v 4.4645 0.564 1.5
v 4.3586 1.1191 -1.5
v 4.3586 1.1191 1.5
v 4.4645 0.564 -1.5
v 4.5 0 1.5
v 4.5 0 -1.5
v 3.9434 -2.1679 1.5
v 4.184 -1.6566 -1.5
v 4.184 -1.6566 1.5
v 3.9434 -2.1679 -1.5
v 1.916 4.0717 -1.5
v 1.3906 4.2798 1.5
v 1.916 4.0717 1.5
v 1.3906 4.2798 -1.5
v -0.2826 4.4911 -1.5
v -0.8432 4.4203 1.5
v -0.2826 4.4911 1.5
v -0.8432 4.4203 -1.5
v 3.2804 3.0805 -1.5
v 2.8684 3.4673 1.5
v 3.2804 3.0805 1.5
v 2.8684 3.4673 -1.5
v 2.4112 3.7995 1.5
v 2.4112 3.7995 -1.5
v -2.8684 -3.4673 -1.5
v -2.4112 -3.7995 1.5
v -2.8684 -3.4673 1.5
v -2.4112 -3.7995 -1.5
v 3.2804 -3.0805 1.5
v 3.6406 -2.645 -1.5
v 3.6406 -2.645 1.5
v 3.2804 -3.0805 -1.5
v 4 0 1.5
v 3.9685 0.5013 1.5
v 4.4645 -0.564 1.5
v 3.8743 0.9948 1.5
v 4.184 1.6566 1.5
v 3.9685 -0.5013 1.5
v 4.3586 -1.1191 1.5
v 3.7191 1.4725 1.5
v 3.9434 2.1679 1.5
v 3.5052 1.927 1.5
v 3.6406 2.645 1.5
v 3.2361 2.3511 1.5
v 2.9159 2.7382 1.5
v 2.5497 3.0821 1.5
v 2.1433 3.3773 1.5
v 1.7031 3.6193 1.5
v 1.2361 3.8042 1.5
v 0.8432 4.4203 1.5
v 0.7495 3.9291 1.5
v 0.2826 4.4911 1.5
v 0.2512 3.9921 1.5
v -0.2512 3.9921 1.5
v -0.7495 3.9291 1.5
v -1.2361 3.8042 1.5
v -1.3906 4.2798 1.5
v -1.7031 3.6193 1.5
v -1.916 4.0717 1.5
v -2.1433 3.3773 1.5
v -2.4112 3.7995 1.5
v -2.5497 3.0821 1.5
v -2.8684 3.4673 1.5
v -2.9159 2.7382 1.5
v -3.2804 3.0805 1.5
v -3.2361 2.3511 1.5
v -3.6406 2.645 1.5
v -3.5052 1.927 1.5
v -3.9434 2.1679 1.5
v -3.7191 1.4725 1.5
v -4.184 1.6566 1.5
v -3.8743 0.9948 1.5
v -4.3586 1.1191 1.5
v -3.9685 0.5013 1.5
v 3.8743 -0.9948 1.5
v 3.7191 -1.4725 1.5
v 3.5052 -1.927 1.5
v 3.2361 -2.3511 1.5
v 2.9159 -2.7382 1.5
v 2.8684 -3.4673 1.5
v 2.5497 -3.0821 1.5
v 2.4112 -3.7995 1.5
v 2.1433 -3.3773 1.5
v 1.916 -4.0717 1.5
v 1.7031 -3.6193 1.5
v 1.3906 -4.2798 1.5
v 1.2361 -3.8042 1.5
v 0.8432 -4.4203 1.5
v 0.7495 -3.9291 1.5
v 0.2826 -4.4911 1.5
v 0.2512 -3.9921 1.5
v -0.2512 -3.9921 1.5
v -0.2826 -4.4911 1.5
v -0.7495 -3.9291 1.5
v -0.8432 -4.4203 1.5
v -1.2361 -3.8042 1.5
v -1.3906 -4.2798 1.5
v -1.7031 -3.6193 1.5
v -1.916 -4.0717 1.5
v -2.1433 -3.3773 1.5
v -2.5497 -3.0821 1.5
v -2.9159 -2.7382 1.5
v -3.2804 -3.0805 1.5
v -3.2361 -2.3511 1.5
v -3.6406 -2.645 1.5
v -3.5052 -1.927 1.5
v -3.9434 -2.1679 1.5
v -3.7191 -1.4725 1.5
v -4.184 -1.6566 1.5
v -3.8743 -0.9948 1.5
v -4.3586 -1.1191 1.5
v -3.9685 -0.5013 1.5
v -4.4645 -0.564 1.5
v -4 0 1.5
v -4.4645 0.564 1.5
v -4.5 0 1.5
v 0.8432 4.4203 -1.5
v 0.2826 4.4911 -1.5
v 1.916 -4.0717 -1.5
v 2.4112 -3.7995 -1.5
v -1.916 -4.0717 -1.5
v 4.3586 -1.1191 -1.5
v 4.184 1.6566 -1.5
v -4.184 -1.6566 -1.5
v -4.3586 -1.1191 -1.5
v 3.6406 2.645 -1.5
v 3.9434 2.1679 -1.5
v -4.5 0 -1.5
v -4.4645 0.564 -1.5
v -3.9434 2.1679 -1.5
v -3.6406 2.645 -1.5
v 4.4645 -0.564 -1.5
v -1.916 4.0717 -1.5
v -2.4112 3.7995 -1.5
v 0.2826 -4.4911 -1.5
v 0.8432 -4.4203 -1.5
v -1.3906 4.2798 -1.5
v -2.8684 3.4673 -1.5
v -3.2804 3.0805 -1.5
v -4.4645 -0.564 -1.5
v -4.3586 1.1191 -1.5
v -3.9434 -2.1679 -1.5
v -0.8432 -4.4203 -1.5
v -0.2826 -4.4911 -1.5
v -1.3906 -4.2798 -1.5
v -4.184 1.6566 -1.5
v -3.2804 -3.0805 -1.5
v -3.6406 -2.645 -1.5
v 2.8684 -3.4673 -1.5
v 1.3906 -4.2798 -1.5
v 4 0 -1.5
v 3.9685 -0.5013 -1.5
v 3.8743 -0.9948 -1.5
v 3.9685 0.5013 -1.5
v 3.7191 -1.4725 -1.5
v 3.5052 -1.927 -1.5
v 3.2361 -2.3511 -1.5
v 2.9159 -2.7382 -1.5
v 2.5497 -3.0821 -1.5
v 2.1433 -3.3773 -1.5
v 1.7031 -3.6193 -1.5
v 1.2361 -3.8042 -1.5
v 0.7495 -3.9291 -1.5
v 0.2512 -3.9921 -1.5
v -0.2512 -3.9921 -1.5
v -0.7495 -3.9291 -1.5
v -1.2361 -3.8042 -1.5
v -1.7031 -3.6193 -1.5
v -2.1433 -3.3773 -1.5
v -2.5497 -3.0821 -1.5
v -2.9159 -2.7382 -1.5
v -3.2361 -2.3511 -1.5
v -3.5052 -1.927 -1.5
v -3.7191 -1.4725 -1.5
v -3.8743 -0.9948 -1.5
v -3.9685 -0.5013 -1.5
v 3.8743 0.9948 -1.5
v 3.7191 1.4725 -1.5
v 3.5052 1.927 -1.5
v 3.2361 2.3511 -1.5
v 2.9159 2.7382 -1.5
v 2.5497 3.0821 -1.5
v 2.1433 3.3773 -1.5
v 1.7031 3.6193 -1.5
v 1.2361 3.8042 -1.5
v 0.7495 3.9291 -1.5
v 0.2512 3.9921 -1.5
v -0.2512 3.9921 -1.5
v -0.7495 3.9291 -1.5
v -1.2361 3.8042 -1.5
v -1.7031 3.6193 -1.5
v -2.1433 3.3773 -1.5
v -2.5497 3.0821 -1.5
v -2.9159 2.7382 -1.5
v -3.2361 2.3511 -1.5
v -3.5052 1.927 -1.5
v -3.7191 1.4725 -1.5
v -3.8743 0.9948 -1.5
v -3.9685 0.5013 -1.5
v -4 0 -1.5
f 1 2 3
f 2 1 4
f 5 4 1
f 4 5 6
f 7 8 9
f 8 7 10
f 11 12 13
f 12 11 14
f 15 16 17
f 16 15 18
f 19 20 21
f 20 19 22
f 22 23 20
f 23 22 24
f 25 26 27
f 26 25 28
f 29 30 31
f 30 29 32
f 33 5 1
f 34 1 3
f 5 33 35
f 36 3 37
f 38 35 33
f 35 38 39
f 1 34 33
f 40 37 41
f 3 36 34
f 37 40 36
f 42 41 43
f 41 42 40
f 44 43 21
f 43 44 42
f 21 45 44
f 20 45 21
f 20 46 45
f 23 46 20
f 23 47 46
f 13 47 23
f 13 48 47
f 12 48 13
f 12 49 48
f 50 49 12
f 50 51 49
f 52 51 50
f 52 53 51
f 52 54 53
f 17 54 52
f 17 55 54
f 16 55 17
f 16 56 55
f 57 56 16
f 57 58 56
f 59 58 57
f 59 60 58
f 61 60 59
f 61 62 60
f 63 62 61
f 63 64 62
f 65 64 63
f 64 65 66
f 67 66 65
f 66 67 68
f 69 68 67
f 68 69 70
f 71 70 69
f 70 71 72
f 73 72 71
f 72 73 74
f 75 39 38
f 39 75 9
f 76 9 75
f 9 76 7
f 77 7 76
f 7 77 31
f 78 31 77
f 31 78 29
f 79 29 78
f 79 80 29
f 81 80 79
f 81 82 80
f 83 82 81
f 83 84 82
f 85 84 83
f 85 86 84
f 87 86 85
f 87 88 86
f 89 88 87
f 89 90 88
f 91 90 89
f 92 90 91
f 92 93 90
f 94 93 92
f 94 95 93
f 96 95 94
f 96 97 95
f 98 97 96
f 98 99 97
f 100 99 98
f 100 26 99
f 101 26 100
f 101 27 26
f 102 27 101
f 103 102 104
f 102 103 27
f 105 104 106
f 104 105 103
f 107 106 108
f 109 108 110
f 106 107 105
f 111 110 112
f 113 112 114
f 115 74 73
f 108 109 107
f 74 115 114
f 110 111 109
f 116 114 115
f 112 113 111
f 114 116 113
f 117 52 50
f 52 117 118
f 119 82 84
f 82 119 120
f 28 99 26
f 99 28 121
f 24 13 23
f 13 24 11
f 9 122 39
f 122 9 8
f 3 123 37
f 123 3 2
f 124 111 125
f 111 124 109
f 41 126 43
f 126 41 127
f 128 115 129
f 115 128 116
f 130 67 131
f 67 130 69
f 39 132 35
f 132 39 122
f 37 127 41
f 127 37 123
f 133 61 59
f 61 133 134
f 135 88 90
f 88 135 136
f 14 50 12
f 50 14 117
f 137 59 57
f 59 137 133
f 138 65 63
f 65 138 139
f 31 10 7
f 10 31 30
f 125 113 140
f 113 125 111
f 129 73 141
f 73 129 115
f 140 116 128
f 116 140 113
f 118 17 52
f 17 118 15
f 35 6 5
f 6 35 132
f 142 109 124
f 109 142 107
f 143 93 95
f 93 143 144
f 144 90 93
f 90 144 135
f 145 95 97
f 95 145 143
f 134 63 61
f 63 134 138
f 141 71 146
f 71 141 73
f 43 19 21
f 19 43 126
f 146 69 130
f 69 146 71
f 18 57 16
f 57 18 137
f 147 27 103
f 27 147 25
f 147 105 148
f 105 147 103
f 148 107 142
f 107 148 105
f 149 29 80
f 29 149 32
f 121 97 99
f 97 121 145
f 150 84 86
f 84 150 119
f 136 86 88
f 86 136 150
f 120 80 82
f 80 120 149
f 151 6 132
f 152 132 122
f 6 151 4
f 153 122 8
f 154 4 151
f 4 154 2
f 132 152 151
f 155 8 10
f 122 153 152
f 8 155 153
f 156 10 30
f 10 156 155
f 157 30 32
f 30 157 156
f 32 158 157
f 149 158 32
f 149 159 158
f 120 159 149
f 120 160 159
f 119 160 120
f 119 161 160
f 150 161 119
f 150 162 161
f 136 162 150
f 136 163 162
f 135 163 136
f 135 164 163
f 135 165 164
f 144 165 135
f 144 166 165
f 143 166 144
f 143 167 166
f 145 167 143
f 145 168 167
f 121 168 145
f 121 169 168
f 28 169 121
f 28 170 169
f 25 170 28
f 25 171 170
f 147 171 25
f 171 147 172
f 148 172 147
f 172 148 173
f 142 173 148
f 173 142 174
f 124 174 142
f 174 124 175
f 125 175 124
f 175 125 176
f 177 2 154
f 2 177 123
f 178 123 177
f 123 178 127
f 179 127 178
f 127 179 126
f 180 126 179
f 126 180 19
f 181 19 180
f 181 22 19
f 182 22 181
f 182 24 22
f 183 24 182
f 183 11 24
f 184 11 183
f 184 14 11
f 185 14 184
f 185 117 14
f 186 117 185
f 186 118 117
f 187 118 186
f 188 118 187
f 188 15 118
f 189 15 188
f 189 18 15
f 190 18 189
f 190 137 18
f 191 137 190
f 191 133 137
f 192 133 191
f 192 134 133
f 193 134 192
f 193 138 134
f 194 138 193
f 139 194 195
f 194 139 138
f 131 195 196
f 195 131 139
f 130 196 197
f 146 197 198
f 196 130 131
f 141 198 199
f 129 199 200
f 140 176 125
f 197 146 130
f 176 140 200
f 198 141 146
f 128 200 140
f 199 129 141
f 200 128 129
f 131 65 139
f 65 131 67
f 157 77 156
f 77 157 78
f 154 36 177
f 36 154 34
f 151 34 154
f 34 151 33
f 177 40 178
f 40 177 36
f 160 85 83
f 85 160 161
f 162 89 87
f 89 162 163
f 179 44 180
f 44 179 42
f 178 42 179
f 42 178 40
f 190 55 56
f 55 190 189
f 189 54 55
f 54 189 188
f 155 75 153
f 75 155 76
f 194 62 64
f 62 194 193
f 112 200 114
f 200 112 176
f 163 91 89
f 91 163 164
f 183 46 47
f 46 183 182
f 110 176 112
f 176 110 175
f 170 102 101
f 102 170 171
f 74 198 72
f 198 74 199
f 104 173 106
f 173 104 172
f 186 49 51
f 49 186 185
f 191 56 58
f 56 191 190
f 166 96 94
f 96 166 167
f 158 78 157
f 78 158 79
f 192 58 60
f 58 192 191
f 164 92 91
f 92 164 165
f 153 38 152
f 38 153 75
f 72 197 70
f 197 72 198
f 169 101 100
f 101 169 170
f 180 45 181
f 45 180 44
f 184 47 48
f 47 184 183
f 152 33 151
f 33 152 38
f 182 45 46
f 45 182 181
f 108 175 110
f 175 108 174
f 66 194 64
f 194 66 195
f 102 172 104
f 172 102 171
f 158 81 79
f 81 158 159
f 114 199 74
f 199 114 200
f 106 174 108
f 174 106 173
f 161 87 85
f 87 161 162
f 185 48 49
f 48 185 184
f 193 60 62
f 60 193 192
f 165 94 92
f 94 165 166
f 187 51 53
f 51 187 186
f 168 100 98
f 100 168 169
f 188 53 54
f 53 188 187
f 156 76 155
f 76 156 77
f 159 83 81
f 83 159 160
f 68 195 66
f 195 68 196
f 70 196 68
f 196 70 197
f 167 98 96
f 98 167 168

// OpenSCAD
$fn = 50;


difference() {
	union() {
		translate(v = [0, 0, -1.5000000000]) {
			cylinder(h = 3, r = 4.5000000000);
		}
	}
	union() {
		translate(v = [0, 0, -100.0000000000]) {
			cylinder(h = 200, r = 4.0000000000);
		}
	}
}
